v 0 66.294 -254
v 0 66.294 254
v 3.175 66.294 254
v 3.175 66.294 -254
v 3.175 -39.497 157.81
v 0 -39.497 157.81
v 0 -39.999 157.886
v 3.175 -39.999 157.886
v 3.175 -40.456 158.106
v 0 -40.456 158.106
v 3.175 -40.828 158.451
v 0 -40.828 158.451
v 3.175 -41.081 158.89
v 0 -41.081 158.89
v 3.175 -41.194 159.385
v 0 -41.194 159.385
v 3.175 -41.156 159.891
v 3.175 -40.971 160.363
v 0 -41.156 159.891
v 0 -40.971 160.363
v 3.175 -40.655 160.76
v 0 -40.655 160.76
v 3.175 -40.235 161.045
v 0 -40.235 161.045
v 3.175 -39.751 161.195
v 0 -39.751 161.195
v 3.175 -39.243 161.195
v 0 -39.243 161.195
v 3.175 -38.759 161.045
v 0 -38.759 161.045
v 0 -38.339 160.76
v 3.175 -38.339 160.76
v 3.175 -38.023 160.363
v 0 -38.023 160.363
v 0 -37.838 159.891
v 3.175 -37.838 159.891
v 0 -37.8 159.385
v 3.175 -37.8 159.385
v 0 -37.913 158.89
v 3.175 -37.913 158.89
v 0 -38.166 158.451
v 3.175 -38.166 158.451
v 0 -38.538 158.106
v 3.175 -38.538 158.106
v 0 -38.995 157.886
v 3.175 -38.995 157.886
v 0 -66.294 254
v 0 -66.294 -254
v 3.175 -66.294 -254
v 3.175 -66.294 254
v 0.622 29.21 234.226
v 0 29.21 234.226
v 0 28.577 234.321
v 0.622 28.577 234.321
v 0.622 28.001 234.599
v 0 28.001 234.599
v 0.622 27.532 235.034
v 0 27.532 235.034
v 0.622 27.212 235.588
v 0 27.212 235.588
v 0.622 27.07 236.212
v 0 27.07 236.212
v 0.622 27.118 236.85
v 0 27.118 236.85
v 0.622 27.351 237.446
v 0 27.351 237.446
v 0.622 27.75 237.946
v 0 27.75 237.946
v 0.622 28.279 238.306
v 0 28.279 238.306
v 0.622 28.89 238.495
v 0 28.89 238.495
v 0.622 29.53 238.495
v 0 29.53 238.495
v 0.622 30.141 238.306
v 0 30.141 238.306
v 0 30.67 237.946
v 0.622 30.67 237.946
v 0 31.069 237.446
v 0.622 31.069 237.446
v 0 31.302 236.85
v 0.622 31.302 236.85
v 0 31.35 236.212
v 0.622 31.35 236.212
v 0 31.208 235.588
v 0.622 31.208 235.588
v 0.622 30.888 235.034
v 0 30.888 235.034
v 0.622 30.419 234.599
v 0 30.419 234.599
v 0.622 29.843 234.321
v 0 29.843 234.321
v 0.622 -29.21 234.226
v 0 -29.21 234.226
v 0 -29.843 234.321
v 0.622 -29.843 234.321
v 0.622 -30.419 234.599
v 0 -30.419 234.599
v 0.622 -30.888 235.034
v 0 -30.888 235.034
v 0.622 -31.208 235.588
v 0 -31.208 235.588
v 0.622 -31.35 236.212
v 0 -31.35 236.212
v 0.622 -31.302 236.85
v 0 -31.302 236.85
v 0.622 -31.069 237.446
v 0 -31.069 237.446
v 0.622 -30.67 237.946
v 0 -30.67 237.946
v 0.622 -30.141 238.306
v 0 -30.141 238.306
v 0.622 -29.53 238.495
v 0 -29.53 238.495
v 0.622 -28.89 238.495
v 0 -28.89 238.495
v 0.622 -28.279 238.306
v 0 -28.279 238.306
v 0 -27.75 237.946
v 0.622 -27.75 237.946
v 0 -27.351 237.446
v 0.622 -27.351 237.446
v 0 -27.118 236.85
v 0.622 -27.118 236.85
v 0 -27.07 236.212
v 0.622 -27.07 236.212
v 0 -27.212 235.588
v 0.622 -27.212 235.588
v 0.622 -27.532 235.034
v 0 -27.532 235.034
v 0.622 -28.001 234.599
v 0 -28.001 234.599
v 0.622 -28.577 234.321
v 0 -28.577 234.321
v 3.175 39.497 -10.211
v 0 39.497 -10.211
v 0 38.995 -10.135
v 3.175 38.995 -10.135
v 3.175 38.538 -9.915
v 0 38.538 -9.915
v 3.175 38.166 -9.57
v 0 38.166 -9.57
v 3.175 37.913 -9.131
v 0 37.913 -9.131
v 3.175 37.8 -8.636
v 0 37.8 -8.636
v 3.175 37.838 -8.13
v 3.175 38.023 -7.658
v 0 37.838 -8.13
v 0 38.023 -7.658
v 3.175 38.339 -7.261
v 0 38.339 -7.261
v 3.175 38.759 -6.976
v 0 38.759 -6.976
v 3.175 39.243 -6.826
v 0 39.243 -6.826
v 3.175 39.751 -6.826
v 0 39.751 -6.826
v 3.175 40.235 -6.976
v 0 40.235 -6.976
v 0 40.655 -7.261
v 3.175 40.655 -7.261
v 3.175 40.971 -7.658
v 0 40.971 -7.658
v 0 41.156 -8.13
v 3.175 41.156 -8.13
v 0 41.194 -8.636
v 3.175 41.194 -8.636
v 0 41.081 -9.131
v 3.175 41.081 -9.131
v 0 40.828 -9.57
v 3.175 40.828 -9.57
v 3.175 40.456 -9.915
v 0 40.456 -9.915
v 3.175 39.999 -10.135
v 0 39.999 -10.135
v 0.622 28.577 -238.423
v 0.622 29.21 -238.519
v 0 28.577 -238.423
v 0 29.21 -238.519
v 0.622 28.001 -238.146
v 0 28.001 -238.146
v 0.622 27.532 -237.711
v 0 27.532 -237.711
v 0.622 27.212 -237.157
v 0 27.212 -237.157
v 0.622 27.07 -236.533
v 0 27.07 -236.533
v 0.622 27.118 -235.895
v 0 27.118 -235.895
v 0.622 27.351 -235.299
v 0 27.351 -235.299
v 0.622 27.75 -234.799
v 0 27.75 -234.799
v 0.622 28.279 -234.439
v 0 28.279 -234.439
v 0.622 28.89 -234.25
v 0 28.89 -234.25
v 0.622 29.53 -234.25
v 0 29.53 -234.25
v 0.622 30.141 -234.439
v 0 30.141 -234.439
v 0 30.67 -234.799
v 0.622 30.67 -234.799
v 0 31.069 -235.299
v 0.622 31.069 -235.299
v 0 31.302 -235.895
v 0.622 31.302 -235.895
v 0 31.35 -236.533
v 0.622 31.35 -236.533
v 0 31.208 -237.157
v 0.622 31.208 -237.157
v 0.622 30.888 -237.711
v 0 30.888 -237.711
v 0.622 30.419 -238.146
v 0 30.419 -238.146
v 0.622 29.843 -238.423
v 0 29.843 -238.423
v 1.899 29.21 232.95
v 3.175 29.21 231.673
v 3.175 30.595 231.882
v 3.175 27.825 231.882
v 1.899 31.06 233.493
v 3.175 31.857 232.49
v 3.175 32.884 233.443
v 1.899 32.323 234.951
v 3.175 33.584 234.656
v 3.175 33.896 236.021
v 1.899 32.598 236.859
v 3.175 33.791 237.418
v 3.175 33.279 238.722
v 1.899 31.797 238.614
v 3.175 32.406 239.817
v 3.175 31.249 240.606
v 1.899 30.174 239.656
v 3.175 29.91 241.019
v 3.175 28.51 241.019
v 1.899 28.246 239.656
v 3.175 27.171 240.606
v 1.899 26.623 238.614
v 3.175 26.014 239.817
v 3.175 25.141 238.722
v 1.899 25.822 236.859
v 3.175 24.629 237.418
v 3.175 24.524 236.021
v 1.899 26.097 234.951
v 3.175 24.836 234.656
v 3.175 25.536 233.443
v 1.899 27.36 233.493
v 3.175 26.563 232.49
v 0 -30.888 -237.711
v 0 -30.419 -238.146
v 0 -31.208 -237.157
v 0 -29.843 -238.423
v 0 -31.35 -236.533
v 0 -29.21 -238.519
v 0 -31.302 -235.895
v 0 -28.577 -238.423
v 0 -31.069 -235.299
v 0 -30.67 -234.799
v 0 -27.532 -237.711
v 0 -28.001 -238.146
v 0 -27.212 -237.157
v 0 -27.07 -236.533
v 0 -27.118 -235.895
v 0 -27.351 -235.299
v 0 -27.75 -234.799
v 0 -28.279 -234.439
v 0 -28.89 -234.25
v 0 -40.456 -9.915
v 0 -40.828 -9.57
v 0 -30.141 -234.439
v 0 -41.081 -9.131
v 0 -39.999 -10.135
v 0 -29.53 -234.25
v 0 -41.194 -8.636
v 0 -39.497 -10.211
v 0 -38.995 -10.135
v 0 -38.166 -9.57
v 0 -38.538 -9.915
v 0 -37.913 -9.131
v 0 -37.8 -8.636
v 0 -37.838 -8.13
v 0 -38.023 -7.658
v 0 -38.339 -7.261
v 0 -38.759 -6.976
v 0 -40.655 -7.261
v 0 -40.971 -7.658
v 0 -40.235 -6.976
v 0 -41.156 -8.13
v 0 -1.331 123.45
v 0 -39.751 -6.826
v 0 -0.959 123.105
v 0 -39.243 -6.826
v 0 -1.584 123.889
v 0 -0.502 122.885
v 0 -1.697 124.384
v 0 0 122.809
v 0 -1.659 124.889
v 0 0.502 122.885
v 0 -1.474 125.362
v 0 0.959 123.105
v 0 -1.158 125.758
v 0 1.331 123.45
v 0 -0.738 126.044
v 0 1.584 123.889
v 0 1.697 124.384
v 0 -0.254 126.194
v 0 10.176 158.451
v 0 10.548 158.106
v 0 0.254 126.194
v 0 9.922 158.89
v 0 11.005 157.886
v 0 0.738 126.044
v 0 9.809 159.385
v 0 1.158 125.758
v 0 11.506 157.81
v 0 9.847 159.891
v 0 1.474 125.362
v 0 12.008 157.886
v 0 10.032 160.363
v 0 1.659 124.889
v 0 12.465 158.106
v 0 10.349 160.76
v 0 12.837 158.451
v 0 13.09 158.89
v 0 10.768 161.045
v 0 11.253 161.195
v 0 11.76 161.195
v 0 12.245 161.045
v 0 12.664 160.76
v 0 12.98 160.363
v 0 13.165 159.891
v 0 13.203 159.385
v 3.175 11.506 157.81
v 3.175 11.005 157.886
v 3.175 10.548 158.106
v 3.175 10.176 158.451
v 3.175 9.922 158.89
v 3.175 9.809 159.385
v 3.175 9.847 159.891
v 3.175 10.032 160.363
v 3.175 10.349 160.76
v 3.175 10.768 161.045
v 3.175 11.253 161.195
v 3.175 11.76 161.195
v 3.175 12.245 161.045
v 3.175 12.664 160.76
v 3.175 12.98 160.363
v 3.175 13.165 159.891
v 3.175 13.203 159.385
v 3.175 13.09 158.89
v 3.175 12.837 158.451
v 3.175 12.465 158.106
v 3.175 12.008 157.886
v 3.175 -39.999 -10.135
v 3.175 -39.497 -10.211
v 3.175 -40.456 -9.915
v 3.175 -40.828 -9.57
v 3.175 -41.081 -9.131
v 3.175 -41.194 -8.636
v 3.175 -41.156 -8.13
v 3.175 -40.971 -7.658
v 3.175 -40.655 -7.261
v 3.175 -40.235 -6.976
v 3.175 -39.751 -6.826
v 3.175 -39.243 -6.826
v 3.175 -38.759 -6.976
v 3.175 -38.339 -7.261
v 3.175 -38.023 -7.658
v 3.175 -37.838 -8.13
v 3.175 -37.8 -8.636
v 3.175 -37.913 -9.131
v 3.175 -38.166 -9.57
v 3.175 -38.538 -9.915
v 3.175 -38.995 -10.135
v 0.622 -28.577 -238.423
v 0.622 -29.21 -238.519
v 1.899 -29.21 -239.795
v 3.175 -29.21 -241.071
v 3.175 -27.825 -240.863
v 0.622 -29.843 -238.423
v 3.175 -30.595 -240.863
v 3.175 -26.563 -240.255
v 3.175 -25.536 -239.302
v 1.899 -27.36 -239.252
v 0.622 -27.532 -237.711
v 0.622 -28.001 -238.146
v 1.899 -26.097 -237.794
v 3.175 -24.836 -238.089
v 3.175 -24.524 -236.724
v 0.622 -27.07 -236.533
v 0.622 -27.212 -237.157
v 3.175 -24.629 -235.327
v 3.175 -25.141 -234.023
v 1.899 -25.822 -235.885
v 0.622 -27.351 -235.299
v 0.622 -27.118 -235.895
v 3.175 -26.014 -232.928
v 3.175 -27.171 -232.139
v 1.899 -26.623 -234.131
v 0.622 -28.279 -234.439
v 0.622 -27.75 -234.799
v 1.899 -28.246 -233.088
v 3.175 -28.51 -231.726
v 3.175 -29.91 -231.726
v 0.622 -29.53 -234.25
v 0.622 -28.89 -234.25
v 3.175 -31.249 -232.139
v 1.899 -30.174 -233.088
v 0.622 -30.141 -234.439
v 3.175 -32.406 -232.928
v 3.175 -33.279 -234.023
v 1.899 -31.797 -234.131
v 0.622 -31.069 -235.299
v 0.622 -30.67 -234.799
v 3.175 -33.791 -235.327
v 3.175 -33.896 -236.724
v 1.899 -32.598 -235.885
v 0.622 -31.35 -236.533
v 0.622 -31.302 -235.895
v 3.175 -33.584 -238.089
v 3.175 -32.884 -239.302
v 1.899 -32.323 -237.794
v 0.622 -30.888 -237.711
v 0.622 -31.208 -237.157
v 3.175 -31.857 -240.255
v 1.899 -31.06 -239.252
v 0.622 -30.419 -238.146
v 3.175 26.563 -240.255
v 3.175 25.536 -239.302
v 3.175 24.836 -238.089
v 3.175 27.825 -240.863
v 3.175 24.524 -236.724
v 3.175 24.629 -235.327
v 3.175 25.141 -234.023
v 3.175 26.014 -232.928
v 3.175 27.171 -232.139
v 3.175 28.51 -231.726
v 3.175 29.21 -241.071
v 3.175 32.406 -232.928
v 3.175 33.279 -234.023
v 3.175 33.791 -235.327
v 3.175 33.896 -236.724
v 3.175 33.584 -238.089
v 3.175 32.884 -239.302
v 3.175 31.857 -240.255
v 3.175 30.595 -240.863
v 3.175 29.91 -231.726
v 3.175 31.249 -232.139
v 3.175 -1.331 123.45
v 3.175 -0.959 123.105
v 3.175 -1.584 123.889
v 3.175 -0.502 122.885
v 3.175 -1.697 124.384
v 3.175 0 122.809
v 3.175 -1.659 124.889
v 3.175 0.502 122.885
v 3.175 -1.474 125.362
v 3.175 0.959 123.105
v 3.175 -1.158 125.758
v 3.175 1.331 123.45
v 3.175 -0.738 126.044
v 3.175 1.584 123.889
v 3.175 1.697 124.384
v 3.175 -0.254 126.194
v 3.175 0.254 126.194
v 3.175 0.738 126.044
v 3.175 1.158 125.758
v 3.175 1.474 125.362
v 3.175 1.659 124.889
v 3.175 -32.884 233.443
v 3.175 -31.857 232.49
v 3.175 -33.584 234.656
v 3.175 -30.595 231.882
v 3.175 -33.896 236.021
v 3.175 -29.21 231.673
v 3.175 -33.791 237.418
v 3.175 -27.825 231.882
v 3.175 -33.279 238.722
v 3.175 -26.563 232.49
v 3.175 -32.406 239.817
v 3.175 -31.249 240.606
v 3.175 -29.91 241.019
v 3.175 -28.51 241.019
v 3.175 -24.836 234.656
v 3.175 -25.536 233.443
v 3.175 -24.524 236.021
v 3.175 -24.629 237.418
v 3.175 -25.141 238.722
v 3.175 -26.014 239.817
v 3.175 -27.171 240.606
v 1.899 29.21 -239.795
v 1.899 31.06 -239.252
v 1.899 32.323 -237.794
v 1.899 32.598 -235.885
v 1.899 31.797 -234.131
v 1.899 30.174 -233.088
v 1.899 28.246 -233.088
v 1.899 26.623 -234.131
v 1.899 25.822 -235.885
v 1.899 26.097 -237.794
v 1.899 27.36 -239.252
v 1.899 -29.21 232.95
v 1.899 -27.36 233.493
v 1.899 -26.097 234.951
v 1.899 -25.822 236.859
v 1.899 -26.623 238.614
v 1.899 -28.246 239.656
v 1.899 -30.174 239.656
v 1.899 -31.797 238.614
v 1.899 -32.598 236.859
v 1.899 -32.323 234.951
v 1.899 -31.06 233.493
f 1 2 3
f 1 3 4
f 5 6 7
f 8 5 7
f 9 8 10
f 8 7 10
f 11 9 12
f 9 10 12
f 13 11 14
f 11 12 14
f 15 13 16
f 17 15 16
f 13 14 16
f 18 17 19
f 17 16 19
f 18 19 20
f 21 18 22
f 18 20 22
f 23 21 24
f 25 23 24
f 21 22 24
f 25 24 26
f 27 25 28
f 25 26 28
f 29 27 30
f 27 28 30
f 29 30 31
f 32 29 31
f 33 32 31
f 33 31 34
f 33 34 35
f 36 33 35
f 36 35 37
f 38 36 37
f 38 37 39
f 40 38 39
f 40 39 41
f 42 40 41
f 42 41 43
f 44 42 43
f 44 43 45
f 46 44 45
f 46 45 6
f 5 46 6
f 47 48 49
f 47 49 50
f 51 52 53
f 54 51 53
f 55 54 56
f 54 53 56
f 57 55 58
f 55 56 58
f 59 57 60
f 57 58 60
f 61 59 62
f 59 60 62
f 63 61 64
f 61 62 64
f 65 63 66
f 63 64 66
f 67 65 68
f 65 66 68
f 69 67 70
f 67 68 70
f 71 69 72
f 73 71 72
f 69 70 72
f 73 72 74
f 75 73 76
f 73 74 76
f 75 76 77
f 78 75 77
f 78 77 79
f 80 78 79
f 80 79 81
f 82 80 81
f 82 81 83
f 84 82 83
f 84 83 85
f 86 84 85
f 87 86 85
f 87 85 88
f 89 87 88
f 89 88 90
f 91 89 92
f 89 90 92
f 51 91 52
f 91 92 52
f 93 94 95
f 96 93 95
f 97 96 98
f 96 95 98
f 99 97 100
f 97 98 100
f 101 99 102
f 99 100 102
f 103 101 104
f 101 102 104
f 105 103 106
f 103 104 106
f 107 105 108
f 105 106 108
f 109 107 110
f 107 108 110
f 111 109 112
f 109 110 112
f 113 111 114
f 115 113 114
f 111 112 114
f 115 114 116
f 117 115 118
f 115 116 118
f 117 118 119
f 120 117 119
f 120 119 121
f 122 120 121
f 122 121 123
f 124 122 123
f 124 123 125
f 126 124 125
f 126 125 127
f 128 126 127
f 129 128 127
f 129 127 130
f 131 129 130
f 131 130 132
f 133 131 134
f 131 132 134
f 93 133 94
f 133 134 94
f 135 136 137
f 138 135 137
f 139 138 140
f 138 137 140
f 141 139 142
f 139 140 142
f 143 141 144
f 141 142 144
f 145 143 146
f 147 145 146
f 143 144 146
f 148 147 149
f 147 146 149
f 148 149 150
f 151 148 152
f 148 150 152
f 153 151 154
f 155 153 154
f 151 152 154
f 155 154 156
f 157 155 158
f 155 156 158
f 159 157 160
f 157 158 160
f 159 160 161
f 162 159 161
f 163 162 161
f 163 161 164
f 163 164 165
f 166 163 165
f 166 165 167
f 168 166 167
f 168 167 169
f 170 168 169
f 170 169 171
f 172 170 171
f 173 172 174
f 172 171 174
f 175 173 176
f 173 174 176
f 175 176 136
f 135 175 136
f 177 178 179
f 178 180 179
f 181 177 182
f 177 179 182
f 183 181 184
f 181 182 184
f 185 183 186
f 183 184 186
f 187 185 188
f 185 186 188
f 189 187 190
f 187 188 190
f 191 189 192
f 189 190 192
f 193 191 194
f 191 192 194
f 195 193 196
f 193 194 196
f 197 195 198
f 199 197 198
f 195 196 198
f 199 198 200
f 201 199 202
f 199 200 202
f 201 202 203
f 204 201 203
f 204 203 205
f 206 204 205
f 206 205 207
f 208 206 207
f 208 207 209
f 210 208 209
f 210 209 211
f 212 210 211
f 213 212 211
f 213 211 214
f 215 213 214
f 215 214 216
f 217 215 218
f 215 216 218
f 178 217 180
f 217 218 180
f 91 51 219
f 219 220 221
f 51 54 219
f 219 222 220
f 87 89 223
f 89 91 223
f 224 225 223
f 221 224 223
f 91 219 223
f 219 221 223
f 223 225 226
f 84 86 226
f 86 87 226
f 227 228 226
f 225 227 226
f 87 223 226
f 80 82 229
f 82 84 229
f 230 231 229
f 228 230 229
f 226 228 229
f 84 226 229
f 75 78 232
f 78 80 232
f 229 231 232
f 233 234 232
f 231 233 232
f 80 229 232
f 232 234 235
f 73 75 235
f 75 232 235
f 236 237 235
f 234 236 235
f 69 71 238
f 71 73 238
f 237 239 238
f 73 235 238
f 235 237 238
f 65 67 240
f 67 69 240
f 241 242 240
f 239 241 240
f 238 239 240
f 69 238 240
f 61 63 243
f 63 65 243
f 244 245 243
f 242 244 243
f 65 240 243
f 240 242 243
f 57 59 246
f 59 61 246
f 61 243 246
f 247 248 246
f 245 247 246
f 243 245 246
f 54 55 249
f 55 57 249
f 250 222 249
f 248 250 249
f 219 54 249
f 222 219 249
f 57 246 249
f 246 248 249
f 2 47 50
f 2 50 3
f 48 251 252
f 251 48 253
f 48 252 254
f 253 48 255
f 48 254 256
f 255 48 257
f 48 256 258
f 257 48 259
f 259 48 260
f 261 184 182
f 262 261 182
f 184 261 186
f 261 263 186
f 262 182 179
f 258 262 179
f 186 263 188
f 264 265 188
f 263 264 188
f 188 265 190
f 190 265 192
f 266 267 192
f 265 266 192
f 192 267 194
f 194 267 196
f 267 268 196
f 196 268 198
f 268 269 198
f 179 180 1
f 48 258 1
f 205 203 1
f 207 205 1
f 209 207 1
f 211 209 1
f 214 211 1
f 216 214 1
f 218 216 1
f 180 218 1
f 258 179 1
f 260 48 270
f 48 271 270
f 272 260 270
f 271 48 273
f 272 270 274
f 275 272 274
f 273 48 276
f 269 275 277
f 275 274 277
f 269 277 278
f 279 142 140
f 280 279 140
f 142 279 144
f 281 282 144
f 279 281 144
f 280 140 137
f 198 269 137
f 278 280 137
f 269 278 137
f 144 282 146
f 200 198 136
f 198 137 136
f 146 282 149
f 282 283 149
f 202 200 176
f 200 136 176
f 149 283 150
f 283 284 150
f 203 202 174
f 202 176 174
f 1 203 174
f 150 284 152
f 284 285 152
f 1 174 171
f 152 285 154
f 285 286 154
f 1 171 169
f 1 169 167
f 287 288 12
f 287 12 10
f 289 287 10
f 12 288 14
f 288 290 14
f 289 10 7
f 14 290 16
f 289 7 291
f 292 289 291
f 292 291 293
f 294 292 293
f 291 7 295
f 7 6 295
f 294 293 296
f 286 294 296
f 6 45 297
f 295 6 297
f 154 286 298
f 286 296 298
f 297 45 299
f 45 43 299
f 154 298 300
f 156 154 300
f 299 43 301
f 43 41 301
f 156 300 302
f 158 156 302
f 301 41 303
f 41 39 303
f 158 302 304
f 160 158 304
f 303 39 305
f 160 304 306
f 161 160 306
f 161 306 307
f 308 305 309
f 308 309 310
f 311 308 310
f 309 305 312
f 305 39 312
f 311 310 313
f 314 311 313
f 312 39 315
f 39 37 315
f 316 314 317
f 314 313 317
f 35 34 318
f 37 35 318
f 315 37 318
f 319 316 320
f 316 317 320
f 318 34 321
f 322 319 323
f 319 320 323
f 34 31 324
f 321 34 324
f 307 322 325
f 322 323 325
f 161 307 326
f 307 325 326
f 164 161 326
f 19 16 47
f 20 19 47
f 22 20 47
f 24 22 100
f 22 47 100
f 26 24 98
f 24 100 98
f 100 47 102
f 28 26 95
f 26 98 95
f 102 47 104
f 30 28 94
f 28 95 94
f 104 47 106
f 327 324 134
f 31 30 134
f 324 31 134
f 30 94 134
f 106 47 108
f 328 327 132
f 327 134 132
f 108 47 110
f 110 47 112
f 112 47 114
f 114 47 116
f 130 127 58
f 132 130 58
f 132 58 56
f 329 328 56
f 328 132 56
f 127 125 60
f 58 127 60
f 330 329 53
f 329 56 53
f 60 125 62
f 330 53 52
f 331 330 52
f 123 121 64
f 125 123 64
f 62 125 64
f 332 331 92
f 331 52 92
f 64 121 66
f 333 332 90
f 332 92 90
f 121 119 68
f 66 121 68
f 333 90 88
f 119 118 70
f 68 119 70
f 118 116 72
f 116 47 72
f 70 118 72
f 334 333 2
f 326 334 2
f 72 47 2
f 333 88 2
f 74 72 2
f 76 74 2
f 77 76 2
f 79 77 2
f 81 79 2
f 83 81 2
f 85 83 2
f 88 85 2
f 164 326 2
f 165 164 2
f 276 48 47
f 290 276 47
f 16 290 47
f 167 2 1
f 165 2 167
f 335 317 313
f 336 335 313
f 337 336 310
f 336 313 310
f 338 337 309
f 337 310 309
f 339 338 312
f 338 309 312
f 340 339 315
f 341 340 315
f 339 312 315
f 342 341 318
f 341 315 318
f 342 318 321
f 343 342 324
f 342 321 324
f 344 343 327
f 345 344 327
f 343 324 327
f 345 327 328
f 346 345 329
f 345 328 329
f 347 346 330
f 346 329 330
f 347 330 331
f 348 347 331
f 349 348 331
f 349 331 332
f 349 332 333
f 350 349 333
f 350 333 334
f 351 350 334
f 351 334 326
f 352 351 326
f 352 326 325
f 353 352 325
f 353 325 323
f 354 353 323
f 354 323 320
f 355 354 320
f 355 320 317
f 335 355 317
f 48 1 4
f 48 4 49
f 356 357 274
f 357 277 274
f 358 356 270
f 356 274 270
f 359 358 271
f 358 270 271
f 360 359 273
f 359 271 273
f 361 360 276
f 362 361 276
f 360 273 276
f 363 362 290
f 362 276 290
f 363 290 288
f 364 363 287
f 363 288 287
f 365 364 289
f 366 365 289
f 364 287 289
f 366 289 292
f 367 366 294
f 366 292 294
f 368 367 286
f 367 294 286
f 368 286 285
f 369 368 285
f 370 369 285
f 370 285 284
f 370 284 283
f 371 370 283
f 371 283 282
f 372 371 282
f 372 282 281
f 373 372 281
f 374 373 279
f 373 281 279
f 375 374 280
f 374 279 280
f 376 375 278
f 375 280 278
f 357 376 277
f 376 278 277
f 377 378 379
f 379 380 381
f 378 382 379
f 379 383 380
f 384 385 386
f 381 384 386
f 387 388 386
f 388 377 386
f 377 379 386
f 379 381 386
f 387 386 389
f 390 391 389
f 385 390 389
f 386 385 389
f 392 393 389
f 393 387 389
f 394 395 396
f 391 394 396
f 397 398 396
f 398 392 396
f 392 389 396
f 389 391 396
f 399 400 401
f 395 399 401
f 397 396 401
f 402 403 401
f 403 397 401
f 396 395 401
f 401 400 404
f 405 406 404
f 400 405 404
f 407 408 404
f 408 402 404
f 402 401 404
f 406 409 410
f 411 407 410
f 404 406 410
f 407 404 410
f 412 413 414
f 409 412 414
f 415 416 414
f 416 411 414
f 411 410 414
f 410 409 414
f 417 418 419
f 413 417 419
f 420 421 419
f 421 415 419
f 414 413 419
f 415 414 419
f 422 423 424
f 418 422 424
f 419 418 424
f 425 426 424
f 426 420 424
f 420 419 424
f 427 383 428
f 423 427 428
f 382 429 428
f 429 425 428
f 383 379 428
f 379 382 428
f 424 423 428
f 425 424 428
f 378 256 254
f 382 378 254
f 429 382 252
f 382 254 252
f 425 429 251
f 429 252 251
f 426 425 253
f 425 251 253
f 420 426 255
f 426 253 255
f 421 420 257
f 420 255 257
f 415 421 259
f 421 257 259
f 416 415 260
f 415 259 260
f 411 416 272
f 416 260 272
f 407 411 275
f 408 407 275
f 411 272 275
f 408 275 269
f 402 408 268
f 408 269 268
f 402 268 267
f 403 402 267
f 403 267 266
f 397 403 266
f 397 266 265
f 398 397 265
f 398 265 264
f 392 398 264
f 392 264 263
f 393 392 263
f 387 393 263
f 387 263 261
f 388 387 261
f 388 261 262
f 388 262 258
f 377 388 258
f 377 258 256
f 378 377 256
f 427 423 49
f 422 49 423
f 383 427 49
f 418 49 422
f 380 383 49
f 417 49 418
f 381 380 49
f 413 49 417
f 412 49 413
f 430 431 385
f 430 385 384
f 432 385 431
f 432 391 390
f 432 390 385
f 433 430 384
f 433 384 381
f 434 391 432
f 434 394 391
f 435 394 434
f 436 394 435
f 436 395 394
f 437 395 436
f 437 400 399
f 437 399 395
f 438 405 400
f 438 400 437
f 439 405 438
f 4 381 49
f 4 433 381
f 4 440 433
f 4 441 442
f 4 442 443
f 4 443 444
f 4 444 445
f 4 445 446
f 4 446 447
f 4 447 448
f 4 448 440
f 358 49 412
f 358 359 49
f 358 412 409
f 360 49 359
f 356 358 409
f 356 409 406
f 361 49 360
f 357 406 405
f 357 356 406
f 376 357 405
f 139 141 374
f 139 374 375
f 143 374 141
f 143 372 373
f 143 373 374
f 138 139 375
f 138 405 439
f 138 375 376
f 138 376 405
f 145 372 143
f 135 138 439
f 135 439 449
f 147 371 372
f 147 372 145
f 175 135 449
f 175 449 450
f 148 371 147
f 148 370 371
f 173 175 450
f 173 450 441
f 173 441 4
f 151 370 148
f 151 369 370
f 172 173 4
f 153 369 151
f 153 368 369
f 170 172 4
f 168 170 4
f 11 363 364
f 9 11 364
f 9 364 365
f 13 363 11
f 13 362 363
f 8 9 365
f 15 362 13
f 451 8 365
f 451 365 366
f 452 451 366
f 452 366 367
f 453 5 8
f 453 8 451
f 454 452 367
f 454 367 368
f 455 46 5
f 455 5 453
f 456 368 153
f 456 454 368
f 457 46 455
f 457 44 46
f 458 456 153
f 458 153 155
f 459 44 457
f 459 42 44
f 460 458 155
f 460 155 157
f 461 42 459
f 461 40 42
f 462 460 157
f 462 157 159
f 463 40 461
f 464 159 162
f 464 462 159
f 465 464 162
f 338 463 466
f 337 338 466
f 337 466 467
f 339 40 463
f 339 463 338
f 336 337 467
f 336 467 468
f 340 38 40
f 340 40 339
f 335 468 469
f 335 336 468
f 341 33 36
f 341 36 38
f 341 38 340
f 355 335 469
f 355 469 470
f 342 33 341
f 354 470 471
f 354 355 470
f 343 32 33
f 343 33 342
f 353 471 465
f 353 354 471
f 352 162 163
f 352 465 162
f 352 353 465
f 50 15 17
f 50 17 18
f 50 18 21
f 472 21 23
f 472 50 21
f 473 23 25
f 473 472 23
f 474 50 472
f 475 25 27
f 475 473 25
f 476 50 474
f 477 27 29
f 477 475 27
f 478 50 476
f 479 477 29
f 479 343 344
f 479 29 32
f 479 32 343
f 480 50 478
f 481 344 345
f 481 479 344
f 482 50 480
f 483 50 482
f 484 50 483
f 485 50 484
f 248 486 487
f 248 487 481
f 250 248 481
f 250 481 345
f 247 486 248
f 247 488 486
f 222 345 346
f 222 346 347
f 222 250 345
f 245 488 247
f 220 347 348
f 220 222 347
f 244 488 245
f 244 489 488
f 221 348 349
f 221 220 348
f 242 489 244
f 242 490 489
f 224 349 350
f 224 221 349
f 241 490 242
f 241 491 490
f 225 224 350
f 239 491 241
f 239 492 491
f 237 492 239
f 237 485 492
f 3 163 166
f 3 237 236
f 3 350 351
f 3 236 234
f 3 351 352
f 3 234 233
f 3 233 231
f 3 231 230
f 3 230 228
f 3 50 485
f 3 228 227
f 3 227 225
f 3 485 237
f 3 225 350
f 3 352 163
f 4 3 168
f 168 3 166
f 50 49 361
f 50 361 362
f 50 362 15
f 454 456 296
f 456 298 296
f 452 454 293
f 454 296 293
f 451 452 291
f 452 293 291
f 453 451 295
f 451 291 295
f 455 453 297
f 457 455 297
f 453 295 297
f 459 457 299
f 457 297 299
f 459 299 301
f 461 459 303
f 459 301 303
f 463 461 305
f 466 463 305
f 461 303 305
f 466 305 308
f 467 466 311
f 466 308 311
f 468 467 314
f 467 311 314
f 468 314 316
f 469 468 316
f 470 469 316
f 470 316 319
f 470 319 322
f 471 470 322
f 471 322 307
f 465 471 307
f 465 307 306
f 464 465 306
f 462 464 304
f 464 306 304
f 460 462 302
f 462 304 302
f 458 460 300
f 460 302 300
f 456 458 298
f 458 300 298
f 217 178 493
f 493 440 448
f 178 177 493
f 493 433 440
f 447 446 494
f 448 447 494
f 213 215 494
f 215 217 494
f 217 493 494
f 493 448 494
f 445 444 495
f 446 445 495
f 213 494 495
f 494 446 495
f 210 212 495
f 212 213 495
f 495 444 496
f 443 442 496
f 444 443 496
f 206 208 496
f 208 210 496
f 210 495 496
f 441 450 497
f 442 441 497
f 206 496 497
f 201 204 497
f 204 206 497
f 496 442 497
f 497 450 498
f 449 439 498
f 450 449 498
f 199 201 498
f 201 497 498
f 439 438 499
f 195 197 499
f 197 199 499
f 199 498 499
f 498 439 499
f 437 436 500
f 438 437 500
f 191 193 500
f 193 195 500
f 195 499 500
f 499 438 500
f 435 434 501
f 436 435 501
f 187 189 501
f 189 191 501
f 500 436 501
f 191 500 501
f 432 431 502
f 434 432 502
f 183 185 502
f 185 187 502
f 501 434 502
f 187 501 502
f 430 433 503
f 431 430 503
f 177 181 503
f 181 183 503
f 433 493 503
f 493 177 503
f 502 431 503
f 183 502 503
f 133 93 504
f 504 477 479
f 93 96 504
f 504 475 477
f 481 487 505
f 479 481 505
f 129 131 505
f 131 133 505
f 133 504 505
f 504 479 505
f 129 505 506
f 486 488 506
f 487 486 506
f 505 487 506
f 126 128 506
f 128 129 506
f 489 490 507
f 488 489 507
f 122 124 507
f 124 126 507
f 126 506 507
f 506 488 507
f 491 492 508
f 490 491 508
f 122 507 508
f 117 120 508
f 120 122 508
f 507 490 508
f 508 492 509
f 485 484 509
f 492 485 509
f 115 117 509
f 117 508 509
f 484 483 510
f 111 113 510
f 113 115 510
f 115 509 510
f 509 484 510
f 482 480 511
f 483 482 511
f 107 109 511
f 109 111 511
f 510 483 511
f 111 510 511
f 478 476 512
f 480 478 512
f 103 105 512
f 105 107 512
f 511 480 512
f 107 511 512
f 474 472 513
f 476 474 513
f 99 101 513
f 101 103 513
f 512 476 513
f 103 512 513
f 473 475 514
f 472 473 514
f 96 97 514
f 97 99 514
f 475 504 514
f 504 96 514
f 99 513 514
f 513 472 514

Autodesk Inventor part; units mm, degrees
ref_plane "YZ Plane" through (0, 0, 0) normal (1, 0, 0) x (0, 1, 0)
ref_plane "XZ Plane" through (0, 0, 0) normal (0, 1, 0) x (-1, 0, 0)
ref_plane "XY Plane" through (0, 0, 0) normal (0, 0, 1) x (1, 0, 0)
sketch "Sketch1" plane through (0, 0, 0) normal (1, 0, 0) x (0, 1, 0)
  line L0 (-66.294, 254) -> (66.294, 254)
  line L1 (66.294, 254) -> (66.294, -254)
  line L2 (66.294, -254) -> (-66.294, -254)
  line L3 (-66.294, -254) -> (-66.294, 254)
  line L4 (-66.294, 254) -> (66.294, -254) construction
  line L5 (66.294, 254) -> (-66.294, -254) construction
  point P0 (0, 0)
  dimension "d0" = 508
  dimension "d1" = 132.588
extrude "pdu nmt right side panel" add sketch "Sketch1" along normal blind 3.175
sketch "snap psu" plane through (0, 0, 0) normal (-1, 0, 0) x (0, 0, 1)
  line L0 (-21.209, -49.5046) -> (-21.209, 49.5046) construction
  line L1 (-21.209, 49.5046) -> (190.5, 49.5046) construction
  line L2 (190.5, 49.5046) -> (190.5, -49.5046) construction
  line L3 (190.5, -49.5046) -> (-21.209, -49.5046) construction
  line L4 (179.5018, -49.5046) -> (179.5018, 49.5046) construction
  line L5 (-254, 66.294) -> (254, 66.294) projected
  line L6 (254, -66.294) -> (254, 66.294) projected
  line L7 (159.512, 11.5062) -> (159.512, -19.2811) construction
  line L8 (-8.509, 39.497) -> (-8.509, -39.497) construction
  line L9 (124.5108, 0) -> (186.1095, 0) construction
  point P0 (0, 0)
  point P1 (159.512, -39.497)
  dimension "d19" = 10.0076
  dimension "d20" = 30.988
  dimension "d21" = 99.0092
  dimension "d22" = 12.7
  dimension "d23" = 10.9982
  dimension "d24" = 16.7894
  dimension "d25" = 63.5
  dimension "d33" = 10.0076
  dimension "d34" = 89.0016
  dimension "d35" = 30.988
  dimension "d36" = 61.0108
  dimension "d37" = 65.9892
  dimension "d38" = 49.5046
  dimension "d39" = 199.009
  dimension "d40" = 199.009
sketch "Sketch5" plane through (3.175, 0, 0) normal (1, 0, 0) x (0, 0, -1)
  point P0 (0, 0)
  point P1 (8.509, 39.497)
  point P2 (8.509, -39.497)
  point P3 (-124.5108, 0)
  point P4 (-159.512, 11.5062)
  point P5 (-159.512, -39.497)
hole "snap psu holes" at (3.175, 11.5062, 159.512) at (3.175, -39.497, 159.512) at (3.175, 0, 124.5108) at (3.175, 39.497, -8.509) at (3.175, -39.497, -8.509) direction (-1, 0, 0) diameter 3.4036 end through all clearance for "Countersunk Flat Head Screw ISO 2009/7046" size "M3" standard "ISO"
sketch "brackets" plane through (3.175, 0, 0) normal (1, 0, 0) x (0, 0, -1)
  line L0 (-254, 66.294) -> (-254, -66.294) construction
  line L1 (-249.428, 54.61) -> (-230.378, 54.61) construction
  line L2 (-230.378, 54.61) -> (-230.378, -54.61) construction
  line L3 (-230.378, -54.61) -> (-249.428, -54.61) construction
  line L4 (-249.428, -54.61) -> (-249.428, 54.61) construction
  line L5 (254, 66.294) -> (-254, 66.294) construction
  line L6 (254, -66.294) -> (254, 66.294) construction
  line L7 (249.428, 54.61) -> (230.378, 54.61) construction
  line L8 (230.378, 54.61) -> (230.378, -54.61) construction
  line L9 (230.378, -54.61) -> (249.428, -54.61) construction
  line L10 (249.428, -54.61) -> (249.428, 54.61) construction
  point P0 (0, 0)
  point P1 (236.3724, 29.21)
  point P2 (236.3724, -29.21)
  point P3 (-236.3724, 29.21)
  point P4 (-236.3724, -29.21)
  dimension "d38" = 49.5046
  dimension "d41" = 11.684
  dimension "d42" = 109.22
  dimension "d43" = 19.05
  dimension "d44" = 11.684
  dimension "d45" = 19.05
  dimension "d46" = 109.22
  dimension "d47" = 25.4
  dimension "d48" = 5.9944
  dimension "d49" = 25.4
  dimension "d50" = 5.9944
  dimension "d51" = 25.4
  dimension "d53" = 25.4
  dimension "d54" = 5.9944
  dimension "d55" = 5.9944
  dimension "d70" = 4.572
  dimension "d71" = 4.572
hole "Hole4" at (3.175, 29.21, -236.3724) at (3.175, -29.21, -236.3724) at (3.175, -29.21, 236.3724) at (3.175, 29.21, 236.3724) direction (-1, 0, 0) diameter 4.2926 end through all countersink diameter 9.398 countersink angle 90 clearance for "Countersunk Flat Head Screw ISO 2009/7046" size "M4" standard "ISO"
properties part number "nmt_sidepanel_20in"
